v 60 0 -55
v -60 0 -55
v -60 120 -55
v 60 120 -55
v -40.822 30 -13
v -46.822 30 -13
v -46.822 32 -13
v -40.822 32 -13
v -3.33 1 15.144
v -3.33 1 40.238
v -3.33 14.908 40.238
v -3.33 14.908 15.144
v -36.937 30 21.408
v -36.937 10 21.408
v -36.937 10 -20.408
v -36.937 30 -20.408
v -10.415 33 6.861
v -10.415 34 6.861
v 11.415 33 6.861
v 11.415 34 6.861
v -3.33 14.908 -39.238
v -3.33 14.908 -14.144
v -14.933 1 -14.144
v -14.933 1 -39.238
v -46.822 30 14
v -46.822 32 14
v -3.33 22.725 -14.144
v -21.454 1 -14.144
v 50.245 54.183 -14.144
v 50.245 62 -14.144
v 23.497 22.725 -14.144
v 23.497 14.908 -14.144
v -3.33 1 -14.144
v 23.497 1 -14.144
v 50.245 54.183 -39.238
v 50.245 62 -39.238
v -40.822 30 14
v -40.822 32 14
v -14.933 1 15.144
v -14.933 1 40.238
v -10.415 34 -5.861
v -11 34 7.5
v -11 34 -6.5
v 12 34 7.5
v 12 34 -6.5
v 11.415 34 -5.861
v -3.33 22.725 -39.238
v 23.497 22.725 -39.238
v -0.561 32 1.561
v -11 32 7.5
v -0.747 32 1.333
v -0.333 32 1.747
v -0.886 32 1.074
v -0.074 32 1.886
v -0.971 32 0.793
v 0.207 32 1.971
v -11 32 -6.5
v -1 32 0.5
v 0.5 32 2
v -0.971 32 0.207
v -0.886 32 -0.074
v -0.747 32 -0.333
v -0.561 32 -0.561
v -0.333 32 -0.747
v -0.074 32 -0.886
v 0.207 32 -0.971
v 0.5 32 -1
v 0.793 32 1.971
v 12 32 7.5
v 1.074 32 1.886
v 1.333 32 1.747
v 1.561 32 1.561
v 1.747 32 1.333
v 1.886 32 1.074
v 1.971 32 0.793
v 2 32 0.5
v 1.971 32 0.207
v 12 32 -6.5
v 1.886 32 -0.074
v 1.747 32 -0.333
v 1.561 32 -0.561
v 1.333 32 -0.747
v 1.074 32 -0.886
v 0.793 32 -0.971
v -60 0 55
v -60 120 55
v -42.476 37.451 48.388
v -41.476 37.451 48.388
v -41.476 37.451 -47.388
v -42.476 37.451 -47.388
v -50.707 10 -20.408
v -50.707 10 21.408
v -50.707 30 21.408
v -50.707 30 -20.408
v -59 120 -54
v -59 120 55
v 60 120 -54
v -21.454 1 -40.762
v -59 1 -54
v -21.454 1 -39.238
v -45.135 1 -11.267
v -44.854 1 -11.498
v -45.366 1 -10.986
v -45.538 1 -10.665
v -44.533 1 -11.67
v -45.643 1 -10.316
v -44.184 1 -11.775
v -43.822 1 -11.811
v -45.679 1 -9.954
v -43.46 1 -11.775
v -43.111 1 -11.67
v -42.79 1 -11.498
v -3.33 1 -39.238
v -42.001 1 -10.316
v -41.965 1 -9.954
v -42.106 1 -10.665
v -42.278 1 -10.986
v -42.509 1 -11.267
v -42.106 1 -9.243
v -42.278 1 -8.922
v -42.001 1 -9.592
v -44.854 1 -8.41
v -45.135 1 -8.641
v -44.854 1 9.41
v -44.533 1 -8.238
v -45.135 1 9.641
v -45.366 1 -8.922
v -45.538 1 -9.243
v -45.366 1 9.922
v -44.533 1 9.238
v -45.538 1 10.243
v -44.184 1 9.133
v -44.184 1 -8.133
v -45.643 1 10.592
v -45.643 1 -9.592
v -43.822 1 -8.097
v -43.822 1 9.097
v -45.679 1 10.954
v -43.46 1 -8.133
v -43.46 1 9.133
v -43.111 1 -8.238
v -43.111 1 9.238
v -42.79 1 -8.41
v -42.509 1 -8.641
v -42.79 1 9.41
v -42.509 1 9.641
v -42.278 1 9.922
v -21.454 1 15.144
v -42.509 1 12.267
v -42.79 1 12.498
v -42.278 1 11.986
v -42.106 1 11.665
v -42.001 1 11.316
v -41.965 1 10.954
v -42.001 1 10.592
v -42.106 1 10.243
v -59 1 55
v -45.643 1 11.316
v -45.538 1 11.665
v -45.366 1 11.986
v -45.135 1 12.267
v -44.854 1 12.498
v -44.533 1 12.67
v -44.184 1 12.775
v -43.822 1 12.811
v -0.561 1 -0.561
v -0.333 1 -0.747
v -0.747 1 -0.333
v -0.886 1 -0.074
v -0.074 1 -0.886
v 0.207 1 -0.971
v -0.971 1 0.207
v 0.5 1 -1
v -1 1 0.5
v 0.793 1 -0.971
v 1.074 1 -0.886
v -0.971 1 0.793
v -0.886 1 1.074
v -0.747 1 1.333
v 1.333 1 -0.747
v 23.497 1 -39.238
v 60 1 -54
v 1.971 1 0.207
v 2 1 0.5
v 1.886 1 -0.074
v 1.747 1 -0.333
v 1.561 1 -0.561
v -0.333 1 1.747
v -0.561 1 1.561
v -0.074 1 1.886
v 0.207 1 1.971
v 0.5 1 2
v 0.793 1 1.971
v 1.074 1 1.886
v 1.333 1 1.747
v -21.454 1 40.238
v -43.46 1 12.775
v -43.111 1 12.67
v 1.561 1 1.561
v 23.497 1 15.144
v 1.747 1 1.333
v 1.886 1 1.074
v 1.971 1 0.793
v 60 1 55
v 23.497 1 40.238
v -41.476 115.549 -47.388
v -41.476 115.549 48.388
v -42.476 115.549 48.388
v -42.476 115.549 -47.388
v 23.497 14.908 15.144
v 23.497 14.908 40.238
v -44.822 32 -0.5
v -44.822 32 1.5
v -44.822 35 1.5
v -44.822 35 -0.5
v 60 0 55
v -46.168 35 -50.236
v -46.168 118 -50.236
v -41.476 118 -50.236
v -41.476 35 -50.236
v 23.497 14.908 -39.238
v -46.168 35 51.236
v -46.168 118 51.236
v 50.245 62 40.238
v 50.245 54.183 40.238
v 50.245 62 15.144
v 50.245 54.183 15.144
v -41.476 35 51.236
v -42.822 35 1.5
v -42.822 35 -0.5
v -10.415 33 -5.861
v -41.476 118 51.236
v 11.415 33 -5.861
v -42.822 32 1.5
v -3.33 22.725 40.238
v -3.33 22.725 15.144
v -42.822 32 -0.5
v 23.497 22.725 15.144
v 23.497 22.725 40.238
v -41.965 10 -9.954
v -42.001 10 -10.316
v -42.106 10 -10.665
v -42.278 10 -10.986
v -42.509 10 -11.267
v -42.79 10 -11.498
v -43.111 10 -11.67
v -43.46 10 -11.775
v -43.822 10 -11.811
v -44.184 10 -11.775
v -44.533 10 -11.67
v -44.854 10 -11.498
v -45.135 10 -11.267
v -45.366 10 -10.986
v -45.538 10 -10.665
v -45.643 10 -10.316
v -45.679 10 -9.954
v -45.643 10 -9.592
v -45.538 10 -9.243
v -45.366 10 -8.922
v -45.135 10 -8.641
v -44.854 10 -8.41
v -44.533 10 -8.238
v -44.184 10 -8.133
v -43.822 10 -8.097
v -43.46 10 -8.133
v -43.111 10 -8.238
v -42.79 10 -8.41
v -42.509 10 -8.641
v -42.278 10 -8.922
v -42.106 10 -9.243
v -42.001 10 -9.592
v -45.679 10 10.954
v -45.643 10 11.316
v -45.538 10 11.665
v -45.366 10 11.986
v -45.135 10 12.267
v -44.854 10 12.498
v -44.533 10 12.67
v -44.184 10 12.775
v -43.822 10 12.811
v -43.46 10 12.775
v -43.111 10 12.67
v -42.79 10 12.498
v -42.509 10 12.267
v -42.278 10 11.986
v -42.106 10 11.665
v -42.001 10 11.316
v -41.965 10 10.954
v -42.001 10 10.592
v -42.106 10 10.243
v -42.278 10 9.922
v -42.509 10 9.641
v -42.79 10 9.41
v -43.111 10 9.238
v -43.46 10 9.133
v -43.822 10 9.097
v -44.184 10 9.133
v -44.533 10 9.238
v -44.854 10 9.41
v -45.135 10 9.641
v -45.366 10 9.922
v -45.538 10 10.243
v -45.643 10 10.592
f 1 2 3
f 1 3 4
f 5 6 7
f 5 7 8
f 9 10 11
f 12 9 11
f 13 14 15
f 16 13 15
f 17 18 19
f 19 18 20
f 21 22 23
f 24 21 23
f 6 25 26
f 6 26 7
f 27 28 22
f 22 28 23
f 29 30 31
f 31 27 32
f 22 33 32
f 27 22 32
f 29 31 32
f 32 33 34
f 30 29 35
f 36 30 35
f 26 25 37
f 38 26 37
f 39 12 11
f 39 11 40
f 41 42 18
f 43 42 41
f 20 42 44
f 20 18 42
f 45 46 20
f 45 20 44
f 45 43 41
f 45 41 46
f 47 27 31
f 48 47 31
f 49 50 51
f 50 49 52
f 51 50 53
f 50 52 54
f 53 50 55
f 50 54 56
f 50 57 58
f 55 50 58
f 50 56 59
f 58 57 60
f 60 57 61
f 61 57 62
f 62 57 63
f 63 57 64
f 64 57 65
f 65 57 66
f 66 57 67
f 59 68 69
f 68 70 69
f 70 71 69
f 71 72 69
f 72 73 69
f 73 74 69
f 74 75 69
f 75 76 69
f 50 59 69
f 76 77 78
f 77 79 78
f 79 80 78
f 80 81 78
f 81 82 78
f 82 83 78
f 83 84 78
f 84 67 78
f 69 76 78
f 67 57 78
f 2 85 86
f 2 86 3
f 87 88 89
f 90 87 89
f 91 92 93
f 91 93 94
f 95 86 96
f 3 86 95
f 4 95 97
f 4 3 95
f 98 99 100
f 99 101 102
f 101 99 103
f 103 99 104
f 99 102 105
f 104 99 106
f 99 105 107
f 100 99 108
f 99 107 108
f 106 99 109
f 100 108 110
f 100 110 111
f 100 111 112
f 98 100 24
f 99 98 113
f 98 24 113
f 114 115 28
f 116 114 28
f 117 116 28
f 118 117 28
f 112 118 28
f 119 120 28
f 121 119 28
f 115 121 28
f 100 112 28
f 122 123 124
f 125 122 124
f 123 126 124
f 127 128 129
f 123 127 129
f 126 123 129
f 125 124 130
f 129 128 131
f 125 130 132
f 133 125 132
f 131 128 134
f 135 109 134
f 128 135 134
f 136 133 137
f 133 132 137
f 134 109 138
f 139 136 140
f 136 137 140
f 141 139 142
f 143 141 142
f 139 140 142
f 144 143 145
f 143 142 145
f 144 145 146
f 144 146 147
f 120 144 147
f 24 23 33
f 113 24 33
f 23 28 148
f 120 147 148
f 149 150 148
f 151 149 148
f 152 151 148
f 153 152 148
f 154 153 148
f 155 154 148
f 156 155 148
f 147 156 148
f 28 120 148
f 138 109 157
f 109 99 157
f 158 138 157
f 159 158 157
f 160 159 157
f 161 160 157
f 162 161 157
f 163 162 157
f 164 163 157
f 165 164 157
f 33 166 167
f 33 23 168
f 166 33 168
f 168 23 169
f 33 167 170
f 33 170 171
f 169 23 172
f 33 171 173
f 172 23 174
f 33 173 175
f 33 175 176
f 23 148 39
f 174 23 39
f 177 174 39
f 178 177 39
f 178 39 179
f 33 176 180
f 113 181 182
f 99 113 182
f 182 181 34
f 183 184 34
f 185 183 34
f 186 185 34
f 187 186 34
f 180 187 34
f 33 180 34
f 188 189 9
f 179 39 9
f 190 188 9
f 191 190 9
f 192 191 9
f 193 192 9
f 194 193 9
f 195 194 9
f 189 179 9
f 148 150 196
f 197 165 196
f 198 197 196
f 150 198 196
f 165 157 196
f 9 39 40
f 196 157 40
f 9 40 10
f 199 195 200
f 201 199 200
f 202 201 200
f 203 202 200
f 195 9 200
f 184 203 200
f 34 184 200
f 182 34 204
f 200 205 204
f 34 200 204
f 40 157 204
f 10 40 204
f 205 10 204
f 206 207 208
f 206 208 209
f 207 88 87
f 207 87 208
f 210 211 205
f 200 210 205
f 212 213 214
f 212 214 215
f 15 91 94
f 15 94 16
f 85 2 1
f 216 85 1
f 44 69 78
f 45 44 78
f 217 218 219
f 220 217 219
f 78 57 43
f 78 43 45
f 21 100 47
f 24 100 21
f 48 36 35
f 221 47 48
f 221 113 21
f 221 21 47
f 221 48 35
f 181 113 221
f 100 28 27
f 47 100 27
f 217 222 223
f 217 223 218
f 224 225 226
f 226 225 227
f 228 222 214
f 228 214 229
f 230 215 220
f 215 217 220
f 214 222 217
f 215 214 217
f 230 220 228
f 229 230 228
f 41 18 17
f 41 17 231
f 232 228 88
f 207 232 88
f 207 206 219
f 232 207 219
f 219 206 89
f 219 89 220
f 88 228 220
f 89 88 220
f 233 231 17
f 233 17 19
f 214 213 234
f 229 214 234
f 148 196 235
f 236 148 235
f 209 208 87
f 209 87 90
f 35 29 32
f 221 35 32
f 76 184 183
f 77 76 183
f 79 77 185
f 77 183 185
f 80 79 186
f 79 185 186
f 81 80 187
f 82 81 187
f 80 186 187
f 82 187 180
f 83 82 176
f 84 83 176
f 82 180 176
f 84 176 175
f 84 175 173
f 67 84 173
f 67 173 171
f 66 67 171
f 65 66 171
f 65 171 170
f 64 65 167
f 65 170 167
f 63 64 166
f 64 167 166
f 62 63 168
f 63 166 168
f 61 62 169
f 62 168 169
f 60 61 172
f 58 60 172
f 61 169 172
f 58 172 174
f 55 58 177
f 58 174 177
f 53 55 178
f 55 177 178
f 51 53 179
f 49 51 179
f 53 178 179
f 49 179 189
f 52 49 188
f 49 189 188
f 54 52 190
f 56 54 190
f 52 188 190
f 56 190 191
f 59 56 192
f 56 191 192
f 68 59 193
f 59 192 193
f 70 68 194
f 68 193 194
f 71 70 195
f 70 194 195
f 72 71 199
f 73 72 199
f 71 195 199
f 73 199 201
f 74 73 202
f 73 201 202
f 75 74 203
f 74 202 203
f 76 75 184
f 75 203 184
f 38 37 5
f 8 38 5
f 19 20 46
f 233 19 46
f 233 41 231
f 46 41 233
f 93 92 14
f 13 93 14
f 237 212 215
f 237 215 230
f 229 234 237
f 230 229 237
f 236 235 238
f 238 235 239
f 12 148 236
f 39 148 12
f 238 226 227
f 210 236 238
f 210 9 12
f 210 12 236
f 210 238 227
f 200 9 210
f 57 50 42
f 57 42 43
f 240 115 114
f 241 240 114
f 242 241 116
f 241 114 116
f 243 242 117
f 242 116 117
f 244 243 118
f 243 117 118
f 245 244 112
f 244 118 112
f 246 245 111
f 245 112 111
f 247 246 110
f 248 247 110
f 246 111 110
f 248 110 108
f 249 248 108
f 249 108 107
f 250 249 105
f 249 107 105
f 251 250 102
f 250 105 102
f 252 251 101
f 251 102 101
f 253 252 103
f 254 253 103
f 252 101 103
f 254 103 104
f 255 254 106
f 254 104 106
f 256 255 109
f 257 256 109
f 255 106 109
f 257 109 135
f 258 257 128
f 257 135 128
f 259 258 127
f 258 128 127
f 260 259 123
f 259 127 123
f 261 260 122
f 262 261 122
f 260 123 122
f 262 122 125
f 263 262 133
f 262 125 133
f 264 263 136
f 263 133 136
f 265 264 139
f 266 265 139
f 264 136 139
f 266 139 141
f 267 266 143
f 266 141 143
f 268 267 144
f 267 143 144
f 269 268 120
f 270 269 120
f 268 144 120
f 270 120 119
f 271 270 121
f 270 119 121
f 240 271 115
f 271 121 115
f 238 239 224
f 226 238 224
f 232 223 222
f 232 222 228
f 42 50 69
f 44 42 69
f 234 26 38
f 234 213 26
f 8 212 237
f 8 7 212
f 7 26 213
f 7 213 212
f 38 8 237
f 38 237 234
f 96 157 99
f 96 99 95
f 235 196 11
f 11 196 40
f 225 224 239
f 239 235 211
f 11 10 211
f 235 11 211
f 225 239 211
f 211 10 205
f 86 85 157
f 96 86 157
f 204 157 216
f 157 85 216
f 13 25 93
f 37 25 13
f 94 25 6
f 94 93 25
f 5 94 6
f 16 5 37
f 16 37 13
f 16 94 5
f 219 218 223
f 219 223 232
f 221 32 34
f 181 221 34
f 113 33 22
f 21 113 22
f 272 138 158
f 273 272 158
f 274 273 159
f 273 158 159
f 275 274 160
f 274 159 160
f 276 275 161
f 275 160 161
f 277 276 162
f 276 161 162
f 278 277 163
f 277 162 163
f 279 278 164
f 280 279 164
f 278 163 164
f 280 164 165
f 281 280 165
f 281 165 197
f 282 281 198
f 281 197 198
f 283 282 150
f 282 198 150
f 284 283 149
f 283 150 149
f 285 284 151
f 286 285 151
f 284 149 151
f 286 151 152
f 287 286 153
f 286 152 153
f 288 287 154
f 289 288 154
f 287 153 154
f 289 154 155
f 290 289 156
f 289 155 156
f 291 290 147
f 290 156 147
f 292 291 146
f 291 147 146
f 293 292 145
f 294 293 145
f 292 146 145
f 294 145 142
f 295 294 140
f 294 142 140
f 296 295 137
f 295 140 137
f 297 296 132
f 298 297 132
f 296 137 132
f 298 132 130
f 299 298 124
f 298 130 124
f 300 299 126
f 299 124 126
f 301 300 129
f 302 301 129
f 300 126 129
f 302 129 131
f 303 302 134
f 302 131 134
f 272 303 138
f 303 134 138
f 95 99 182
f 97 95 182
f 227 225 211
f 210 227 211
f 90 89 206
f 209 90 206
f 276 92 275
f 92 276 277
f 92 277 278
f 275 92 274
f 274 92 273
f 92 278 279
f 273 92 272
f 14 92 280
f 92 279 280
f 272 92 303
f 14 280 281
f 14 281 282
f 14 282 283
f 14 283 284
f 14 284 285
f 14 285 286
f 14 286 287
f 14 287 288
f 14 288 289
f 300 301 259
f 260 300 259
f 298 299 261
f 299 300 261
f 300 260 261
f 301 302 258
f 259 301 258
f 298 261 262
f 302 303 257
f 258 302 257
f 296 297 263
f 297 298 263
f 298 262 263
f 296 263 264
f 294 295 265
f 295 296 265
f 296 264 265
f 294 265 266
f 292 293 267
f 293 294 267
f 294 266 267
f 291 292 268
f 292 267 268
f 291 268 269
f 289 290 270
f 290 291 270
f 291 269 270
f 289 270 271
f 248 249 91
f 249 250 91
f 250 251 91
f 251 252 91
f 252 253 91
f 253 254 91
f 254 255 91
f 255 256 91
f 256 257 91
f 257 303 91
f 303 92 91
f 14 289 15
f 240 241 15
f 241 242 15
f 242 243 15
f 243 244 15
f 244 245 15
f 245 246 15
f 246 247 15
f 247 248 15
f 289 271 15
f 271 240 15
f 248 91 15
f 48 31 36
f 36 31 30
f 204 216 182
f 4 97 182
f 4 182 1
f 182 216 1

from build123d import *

# Parameters (mm, degrees)
SKETCH_1_W          = 120
SKETCH_1_H          = 110
EXTRUDE_1_DEPTH     = 120
SKETCH_2_W          = 119
SKETCH_2_H          = 119
CUT_EXTRUDE_1_DEPTH = 109
SKETCH_3_W          = 13.76951007
SKETCH_3_H          = 41.816324506
EXTRUDE_2_DEPTH     = 29
SKETCH_3_2_W        = 13.76951007
SKETCH_3_2_H        = 41.816324506
CUT_EXTRUDE_2_DEPTH = 9
SKETCH_6_R          = 1.856942382
EXTRUDE_4_DEPTH     = 9
SKETCH_7_W          = 6
SKETCH_7_H          = 27
EXTRUDE_5_DEPTH     = 2
SKETCH_8_W          = 2
SKETCH_8_H          = 2
EXTRUDE_6_DEPTH     = 3
SKETCH_9_W          = 4.691076501
SKETCH_9_H          = 101.472246916
EXTRUDE_7_DEPTH     = 83
SKETCH_10_W         = 95.77595166
SKETCH_10_H         = 78.098220696
CUT_EXTRUDE_3_DEPTH = 1
SKETCH_11_W         = 71.699562075
SKETCH_11_H         = 25.094846726
EXTRUDE_9_DEPTH     = 61
CUT_EXTRUDE_4_DEPTH = 81
SKETCH_13_R         = 1.5
EXTRUDE_10_DEPTH    = 31
SKETCH_14_W         = 23
SKETCH_14_H         = 14
EXTRUDE_11_DEPTH    = 2
SKETCH_15_W         = 21.829901038
SKETCH_15_H         = 12.722773114
CUT_EXTRUDE_5_DEPTH = 1


with BuildPart() as part:
    # 스케치1 → 보스-돌출1 (new body)
    with BuildSketch(Plane(origin=(0, 0, 0), x_dir=(1, 0, 0), z_dir=(0, 1, 0))):
        Rectangle(SKETCH_1_W, SKETCH_1_H)
    extrude(amount=EXTRUDE_1_DEPTH)

    # 스케치2 → 컷-돌출1 (cut)
    with BuildSketch(Plane.XY.offset(55)):
        with Locations((0.5, 60.5)):
            Rectangle(SKETCH_2_W, SKETCH_2_H)
    extrude(amount=-CUT_EXTRUDE_1_DEPTH, mode=Mode.SUBTRACT)

    # 스케치3 → 보스-돌출2 (add)
    with BuildSketch(Plane(origin=(0, 1, 0), x_dir=(1, 0, 0), z_dir=(0, 1, 0))):
        with Locations((-43.822012207, -0.5)):
            Rectangle(SKETCH_3_W, SKETCH_3_H)
    extrude(amount=EXTRUDE_2_DEPTH)

    # 스케치3<2> → 컷-돌출2 (cut)
    with BuildSketch(Plane(origin=(0, 1, 0), x_dir=(1, 0, 0), z_dir=(0, 1, 0))):
        with Locations((-43.822012207, -0.5)):
            Rectangle(SKETCH_3_2_W, SKETCH_3_2_H)
    extrude(amount=CUT_EXTRUDE_2_DEPTH, mode=Mode.SUBTRACT)


with BuildPart() as cut_extrude_2_piece_1:
    # of the separate pieces the step leaves, piece 1, a body of its own (cut_extrude_2_pieces)
    add(part.part.solids().sort_by_distance((-60, 0, -55))[0])



with BuildPart() as cut_extrude_2_piece_2:
    # of the separate pieces the step leaves, piece 2, a body of its own (cut_extrude_2_pieces)
    add(part.part.solids().sort_by_distance((-50.706767242, 10, -20.408162253))[0])


with BuildPart() as cut_extrude_2_piece_1_1:
    add(cut_extrude_2_piece_1.part)

    add(cut_extrude_2_piece_2.part)  # 보스-돌출4 merges 컷-돌출2 piece 2
    # 스케치6 → 보스-돌출4 (add)
    with BuildSketch(Plane(origin=(0, 1, 0), x_dir=(1, 0, 0), z_dir=(0, 1, 0))):
        with Locations((-43.822012207, 9.954081127)):
            Circle(SKETCH_6_R)
        with Locations((-43.822012207, -10.954081127)):
            Circle(SKETCH_6_R)
    extrude(amount=EXTRUDE_4_DEPTH)



with BuildPart() as body_2:
    # 스케치7 → 보스-돌출5 (new body)
    with BuildSketch(Plane(origin=(0, 30, 0), x_dir=(1, 0, 0), z_dir=(0, 1, 0))):
        with Locations((-43.822012207, -0.5)):
            Rectangle(SKETCH_7_W, SKETCH_7_H)
    extrude(amount=EXTRUDE_5_DEPTH)


with BuildPart() as cut_extrude_2_piece_1_2:
    add(cut_extrude_2_piece_1_1.part)

    add(body_2.part)  # 보스-돌출6 merges body 2
    # 스케치8 → 보스-돌출6 (add)
    with BuildSketch(Plane(origin=(0, 32, 0), x_dir=(1, 0, 0), z_dir=(0, 1, 0))):
        with Locations((-43.822012207, -0.5)):
            Rectangle(SKETCH_8_W, SKETCH_8_H)
    extrude(amount=EXTRUDE_6_DEPTH)

    # 스케치9 → 보스-돌출7 (add)
    with BuildSketch(Plane(origin=(0, 35, 0), x_dir=(1, 0, 0), z_dir=(0, 1, 0))):
        with Locations((-43.822012208, -0.5)):
            Rectangle(SKETCH_9_W, SKETCH_9_H)
    extrude(amount=EXTRUDE_7_DEPTH)

    # 스케치10 → 컷-돌출3 (cut)
    with BuildSketch(Plane(origin=(-41.476473957, 0, 0), x_dir=(0, 0, -1), z_dir=(1, 0, 0))):
        with Locations((-0.5, 76.5)):
            Rectangle(SKETCH_10_W, SKETCH_10_H)
    extrude(amount=-CUT_EXTRUDE_3_DEPTH, mode=Mode.SUBTRACT)

    # 스케치11 → 보스-돌출9 (add)
    with BuildSketch(Plane(origin=(0, 1, 0), x_dir=(1, 0, 0), z_dir=(0, 1, 0))):
        with Locations((14.395545437, -27.691005805)):
            Rectangle(SKETCH_11_W, SKETCH_11_H)
        with Locations((14.395545437, 26.691005805)):
            Rectangle(SKETCH_11_W, SKETCH_11_H)
    extrude(amount=EXTRUDE_9_DEPTH)

    # 스케치12 → 컷-돌출4 (cut)
    with BuildSketch(Plane.XY.offset(40.238429168)):
        Polygon((-21.454235601, 62), (-21.454235601, 1), (-3.329674483, 22.725113556), (23.497466254, 22.725113556), (50.245326474, 62), align=None)
        Polygon((-3.329674483, 14.908243333), (-14.932873043, 1), (-3.329674483, 1), align=None)
        Polygon((23.497466254, 14.908243333), (23.497466254, 1), (50.245326474, 1), (50.245326474, 54.183129777), align=None)
    extrude(amount=-CUT_EXTRUDE_4_DEPTH, mode=Mode.SUBTRACT)

    # 스케치13 → 보스-돌출10 (add)
    with BuildSketch(Plane(origin=(0, 1, 0), x_dir=(1, 0, 0), z_dir=(0, 1, 0))):
        with Locations((0.5, -0.5)):
            Circle(SKETCH_13_R)
    extrude(amount=EXTRUDE_10_DEPTH)

    # 스케치14 → 보스-돌출11 (add)
    with BuildSketch(Plane(origin=(0, 32, 0), x_dir=(1, 0, 0), z_dir=(0, 1, 0))):
        with Locations((0.5, -0.5)):
            Rectangle(SKETCH_14_W, SKETCH_14_H)
    extrude(amount=EXTRUDE_11_DEPTH)

    # 스케치15 → 컷-돌출5 (cut)
    with BuildSketch(Plane(origin=(0, 34, 0), x_dir=(1, 0, 0), z_dir=(0, 1, 0))):
        with Locations((0.5, -0.5)):
            Rectangle(SKETCH_15_W, SKETCH_15_H)
    extrude(amount=-CUT_EXTRUDE_5_DEPTH, mode=Mode.SUBTRACT)


solid = cut_extrude_2_piece_1_2.part
